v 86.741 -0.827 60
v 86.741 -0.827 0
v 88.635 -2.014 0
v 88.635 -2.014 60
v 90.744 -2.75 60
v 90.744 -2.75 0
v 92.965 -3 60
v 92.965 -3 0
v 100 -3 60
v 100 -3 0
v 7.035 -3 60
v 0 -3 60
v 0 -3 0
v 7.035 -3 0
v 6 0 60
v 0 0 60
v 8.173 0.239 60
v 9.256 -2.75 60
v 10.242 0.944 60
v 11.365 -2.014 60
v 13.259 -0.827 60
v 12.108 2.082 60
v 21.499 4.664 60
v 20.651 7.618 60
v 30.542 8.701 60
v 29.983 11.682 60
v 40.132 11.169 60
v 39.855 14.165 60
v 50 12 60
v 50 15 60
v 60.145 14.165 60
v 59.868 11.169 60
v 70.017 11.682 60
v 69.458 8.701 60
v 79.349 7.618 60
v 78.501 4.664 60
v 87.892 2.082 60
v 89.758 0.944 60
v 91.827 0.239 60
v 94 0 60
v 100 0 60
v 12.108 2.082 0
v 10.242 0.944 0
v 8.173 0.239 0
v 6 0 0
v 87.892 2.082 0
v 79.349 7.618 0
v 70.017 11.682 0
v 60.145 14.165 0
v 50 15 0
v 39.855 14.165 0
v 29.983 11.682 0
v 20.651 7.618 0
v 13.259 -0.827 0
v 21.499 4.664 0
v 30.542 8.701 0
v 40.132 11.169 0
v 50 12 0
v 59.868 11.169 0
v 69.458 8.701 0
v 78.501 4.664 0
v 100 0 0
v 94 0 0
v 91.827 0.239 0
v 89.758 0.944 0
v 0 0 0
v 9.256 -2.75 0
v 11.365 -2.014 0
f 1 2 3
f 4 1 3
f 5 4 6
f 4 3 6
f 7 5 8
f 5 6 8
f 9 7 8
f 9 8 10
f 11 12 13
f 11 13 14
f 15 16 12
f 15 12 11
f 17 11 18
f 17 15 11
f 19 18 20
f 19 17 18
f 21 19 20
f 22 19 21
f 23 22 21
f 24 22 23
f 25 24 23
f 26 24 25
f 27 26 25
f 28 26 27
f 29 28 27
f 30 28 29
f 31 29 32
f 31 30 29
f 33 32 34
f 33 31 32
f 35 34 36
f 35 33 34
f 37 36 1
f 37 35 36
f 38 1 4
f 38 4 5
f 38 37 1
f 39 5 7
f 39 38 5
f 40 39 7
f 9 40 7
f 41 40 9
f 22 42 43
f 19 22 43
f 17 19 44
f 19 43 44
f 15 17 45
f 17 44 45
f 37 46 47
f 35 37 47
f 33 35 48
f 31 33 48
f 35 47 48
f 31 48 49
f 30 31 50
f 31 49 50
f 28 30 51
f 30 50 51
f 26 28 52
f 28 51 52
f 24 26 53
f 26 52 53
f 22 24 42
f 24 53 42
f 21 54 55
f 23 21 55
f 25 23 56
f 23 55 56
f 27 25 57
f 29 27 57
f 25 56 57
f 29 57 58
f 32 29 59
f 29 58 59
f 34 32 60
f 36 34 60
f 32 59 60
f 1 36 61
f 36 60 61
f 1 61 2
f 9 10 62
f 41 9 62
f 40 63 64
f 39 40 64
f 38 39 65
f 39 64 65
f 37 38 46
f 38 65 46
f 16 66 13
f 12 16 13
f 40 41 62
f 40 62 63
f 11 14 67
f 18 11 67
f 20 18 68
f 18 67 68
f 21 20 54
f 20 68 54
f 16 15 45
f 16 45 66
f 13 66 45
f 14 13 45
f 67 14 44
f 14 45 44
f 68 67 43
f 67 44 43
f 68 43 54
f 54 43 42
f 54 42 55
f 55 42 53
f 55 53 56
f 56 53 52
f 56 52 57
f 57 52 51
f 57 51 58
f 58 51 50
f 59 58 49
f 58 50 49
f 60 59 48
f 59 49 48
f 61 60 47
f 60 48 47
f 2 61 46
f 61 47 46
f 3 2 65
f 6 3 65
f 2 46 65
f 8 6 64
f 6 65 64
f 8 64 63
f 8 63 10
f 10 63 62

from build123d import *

# Parameters (mm, degrees)
BOSS_EXTRUDE1_DEPTH = 60


with BuildPart() as part:
    # Sketch1 → Boss-Extrude1 (new body)
    with BuildSketch(Plane.XY):
        with BuildLine():
            Line((0, 0), (0, -3))
            Line((0, -3), (7.034897882, -3))
            ThreePointArc((7.034897882, -3), (10.331004184, -2.441169591), (13.2587176, -0.827136649))
            ThreePointArc((13.2587176, -0.827136649), (50, 12), (86.7412824, -0.827136649))
            ThreePointArc((86.7412824, -0.827136649), (89.668995816, -2.441169591), (92.965102118, -3))
            Line((92.965102118, -3), (100, -3))
            Line((100, -3), (100, 0))
            Line((100, 0), (94, 0))
            ThreePointArc((94, 0), (90.773260722, 0.534898118), (87.891716798, 2.082369273))
            ThreePointArc((87.891716798, 2.082369273), (50, 15), (12.108283202, 2.082369273))
            ThreePointArc((12.108283202, 2.082369273), (9.226739278, 0.534898118), (6, 0))
            Line((6, 0), (0, 0))
        make_face()
    extrude(amount=BOSS_EXTRUDE1_DEPTH)


solid = part.part
